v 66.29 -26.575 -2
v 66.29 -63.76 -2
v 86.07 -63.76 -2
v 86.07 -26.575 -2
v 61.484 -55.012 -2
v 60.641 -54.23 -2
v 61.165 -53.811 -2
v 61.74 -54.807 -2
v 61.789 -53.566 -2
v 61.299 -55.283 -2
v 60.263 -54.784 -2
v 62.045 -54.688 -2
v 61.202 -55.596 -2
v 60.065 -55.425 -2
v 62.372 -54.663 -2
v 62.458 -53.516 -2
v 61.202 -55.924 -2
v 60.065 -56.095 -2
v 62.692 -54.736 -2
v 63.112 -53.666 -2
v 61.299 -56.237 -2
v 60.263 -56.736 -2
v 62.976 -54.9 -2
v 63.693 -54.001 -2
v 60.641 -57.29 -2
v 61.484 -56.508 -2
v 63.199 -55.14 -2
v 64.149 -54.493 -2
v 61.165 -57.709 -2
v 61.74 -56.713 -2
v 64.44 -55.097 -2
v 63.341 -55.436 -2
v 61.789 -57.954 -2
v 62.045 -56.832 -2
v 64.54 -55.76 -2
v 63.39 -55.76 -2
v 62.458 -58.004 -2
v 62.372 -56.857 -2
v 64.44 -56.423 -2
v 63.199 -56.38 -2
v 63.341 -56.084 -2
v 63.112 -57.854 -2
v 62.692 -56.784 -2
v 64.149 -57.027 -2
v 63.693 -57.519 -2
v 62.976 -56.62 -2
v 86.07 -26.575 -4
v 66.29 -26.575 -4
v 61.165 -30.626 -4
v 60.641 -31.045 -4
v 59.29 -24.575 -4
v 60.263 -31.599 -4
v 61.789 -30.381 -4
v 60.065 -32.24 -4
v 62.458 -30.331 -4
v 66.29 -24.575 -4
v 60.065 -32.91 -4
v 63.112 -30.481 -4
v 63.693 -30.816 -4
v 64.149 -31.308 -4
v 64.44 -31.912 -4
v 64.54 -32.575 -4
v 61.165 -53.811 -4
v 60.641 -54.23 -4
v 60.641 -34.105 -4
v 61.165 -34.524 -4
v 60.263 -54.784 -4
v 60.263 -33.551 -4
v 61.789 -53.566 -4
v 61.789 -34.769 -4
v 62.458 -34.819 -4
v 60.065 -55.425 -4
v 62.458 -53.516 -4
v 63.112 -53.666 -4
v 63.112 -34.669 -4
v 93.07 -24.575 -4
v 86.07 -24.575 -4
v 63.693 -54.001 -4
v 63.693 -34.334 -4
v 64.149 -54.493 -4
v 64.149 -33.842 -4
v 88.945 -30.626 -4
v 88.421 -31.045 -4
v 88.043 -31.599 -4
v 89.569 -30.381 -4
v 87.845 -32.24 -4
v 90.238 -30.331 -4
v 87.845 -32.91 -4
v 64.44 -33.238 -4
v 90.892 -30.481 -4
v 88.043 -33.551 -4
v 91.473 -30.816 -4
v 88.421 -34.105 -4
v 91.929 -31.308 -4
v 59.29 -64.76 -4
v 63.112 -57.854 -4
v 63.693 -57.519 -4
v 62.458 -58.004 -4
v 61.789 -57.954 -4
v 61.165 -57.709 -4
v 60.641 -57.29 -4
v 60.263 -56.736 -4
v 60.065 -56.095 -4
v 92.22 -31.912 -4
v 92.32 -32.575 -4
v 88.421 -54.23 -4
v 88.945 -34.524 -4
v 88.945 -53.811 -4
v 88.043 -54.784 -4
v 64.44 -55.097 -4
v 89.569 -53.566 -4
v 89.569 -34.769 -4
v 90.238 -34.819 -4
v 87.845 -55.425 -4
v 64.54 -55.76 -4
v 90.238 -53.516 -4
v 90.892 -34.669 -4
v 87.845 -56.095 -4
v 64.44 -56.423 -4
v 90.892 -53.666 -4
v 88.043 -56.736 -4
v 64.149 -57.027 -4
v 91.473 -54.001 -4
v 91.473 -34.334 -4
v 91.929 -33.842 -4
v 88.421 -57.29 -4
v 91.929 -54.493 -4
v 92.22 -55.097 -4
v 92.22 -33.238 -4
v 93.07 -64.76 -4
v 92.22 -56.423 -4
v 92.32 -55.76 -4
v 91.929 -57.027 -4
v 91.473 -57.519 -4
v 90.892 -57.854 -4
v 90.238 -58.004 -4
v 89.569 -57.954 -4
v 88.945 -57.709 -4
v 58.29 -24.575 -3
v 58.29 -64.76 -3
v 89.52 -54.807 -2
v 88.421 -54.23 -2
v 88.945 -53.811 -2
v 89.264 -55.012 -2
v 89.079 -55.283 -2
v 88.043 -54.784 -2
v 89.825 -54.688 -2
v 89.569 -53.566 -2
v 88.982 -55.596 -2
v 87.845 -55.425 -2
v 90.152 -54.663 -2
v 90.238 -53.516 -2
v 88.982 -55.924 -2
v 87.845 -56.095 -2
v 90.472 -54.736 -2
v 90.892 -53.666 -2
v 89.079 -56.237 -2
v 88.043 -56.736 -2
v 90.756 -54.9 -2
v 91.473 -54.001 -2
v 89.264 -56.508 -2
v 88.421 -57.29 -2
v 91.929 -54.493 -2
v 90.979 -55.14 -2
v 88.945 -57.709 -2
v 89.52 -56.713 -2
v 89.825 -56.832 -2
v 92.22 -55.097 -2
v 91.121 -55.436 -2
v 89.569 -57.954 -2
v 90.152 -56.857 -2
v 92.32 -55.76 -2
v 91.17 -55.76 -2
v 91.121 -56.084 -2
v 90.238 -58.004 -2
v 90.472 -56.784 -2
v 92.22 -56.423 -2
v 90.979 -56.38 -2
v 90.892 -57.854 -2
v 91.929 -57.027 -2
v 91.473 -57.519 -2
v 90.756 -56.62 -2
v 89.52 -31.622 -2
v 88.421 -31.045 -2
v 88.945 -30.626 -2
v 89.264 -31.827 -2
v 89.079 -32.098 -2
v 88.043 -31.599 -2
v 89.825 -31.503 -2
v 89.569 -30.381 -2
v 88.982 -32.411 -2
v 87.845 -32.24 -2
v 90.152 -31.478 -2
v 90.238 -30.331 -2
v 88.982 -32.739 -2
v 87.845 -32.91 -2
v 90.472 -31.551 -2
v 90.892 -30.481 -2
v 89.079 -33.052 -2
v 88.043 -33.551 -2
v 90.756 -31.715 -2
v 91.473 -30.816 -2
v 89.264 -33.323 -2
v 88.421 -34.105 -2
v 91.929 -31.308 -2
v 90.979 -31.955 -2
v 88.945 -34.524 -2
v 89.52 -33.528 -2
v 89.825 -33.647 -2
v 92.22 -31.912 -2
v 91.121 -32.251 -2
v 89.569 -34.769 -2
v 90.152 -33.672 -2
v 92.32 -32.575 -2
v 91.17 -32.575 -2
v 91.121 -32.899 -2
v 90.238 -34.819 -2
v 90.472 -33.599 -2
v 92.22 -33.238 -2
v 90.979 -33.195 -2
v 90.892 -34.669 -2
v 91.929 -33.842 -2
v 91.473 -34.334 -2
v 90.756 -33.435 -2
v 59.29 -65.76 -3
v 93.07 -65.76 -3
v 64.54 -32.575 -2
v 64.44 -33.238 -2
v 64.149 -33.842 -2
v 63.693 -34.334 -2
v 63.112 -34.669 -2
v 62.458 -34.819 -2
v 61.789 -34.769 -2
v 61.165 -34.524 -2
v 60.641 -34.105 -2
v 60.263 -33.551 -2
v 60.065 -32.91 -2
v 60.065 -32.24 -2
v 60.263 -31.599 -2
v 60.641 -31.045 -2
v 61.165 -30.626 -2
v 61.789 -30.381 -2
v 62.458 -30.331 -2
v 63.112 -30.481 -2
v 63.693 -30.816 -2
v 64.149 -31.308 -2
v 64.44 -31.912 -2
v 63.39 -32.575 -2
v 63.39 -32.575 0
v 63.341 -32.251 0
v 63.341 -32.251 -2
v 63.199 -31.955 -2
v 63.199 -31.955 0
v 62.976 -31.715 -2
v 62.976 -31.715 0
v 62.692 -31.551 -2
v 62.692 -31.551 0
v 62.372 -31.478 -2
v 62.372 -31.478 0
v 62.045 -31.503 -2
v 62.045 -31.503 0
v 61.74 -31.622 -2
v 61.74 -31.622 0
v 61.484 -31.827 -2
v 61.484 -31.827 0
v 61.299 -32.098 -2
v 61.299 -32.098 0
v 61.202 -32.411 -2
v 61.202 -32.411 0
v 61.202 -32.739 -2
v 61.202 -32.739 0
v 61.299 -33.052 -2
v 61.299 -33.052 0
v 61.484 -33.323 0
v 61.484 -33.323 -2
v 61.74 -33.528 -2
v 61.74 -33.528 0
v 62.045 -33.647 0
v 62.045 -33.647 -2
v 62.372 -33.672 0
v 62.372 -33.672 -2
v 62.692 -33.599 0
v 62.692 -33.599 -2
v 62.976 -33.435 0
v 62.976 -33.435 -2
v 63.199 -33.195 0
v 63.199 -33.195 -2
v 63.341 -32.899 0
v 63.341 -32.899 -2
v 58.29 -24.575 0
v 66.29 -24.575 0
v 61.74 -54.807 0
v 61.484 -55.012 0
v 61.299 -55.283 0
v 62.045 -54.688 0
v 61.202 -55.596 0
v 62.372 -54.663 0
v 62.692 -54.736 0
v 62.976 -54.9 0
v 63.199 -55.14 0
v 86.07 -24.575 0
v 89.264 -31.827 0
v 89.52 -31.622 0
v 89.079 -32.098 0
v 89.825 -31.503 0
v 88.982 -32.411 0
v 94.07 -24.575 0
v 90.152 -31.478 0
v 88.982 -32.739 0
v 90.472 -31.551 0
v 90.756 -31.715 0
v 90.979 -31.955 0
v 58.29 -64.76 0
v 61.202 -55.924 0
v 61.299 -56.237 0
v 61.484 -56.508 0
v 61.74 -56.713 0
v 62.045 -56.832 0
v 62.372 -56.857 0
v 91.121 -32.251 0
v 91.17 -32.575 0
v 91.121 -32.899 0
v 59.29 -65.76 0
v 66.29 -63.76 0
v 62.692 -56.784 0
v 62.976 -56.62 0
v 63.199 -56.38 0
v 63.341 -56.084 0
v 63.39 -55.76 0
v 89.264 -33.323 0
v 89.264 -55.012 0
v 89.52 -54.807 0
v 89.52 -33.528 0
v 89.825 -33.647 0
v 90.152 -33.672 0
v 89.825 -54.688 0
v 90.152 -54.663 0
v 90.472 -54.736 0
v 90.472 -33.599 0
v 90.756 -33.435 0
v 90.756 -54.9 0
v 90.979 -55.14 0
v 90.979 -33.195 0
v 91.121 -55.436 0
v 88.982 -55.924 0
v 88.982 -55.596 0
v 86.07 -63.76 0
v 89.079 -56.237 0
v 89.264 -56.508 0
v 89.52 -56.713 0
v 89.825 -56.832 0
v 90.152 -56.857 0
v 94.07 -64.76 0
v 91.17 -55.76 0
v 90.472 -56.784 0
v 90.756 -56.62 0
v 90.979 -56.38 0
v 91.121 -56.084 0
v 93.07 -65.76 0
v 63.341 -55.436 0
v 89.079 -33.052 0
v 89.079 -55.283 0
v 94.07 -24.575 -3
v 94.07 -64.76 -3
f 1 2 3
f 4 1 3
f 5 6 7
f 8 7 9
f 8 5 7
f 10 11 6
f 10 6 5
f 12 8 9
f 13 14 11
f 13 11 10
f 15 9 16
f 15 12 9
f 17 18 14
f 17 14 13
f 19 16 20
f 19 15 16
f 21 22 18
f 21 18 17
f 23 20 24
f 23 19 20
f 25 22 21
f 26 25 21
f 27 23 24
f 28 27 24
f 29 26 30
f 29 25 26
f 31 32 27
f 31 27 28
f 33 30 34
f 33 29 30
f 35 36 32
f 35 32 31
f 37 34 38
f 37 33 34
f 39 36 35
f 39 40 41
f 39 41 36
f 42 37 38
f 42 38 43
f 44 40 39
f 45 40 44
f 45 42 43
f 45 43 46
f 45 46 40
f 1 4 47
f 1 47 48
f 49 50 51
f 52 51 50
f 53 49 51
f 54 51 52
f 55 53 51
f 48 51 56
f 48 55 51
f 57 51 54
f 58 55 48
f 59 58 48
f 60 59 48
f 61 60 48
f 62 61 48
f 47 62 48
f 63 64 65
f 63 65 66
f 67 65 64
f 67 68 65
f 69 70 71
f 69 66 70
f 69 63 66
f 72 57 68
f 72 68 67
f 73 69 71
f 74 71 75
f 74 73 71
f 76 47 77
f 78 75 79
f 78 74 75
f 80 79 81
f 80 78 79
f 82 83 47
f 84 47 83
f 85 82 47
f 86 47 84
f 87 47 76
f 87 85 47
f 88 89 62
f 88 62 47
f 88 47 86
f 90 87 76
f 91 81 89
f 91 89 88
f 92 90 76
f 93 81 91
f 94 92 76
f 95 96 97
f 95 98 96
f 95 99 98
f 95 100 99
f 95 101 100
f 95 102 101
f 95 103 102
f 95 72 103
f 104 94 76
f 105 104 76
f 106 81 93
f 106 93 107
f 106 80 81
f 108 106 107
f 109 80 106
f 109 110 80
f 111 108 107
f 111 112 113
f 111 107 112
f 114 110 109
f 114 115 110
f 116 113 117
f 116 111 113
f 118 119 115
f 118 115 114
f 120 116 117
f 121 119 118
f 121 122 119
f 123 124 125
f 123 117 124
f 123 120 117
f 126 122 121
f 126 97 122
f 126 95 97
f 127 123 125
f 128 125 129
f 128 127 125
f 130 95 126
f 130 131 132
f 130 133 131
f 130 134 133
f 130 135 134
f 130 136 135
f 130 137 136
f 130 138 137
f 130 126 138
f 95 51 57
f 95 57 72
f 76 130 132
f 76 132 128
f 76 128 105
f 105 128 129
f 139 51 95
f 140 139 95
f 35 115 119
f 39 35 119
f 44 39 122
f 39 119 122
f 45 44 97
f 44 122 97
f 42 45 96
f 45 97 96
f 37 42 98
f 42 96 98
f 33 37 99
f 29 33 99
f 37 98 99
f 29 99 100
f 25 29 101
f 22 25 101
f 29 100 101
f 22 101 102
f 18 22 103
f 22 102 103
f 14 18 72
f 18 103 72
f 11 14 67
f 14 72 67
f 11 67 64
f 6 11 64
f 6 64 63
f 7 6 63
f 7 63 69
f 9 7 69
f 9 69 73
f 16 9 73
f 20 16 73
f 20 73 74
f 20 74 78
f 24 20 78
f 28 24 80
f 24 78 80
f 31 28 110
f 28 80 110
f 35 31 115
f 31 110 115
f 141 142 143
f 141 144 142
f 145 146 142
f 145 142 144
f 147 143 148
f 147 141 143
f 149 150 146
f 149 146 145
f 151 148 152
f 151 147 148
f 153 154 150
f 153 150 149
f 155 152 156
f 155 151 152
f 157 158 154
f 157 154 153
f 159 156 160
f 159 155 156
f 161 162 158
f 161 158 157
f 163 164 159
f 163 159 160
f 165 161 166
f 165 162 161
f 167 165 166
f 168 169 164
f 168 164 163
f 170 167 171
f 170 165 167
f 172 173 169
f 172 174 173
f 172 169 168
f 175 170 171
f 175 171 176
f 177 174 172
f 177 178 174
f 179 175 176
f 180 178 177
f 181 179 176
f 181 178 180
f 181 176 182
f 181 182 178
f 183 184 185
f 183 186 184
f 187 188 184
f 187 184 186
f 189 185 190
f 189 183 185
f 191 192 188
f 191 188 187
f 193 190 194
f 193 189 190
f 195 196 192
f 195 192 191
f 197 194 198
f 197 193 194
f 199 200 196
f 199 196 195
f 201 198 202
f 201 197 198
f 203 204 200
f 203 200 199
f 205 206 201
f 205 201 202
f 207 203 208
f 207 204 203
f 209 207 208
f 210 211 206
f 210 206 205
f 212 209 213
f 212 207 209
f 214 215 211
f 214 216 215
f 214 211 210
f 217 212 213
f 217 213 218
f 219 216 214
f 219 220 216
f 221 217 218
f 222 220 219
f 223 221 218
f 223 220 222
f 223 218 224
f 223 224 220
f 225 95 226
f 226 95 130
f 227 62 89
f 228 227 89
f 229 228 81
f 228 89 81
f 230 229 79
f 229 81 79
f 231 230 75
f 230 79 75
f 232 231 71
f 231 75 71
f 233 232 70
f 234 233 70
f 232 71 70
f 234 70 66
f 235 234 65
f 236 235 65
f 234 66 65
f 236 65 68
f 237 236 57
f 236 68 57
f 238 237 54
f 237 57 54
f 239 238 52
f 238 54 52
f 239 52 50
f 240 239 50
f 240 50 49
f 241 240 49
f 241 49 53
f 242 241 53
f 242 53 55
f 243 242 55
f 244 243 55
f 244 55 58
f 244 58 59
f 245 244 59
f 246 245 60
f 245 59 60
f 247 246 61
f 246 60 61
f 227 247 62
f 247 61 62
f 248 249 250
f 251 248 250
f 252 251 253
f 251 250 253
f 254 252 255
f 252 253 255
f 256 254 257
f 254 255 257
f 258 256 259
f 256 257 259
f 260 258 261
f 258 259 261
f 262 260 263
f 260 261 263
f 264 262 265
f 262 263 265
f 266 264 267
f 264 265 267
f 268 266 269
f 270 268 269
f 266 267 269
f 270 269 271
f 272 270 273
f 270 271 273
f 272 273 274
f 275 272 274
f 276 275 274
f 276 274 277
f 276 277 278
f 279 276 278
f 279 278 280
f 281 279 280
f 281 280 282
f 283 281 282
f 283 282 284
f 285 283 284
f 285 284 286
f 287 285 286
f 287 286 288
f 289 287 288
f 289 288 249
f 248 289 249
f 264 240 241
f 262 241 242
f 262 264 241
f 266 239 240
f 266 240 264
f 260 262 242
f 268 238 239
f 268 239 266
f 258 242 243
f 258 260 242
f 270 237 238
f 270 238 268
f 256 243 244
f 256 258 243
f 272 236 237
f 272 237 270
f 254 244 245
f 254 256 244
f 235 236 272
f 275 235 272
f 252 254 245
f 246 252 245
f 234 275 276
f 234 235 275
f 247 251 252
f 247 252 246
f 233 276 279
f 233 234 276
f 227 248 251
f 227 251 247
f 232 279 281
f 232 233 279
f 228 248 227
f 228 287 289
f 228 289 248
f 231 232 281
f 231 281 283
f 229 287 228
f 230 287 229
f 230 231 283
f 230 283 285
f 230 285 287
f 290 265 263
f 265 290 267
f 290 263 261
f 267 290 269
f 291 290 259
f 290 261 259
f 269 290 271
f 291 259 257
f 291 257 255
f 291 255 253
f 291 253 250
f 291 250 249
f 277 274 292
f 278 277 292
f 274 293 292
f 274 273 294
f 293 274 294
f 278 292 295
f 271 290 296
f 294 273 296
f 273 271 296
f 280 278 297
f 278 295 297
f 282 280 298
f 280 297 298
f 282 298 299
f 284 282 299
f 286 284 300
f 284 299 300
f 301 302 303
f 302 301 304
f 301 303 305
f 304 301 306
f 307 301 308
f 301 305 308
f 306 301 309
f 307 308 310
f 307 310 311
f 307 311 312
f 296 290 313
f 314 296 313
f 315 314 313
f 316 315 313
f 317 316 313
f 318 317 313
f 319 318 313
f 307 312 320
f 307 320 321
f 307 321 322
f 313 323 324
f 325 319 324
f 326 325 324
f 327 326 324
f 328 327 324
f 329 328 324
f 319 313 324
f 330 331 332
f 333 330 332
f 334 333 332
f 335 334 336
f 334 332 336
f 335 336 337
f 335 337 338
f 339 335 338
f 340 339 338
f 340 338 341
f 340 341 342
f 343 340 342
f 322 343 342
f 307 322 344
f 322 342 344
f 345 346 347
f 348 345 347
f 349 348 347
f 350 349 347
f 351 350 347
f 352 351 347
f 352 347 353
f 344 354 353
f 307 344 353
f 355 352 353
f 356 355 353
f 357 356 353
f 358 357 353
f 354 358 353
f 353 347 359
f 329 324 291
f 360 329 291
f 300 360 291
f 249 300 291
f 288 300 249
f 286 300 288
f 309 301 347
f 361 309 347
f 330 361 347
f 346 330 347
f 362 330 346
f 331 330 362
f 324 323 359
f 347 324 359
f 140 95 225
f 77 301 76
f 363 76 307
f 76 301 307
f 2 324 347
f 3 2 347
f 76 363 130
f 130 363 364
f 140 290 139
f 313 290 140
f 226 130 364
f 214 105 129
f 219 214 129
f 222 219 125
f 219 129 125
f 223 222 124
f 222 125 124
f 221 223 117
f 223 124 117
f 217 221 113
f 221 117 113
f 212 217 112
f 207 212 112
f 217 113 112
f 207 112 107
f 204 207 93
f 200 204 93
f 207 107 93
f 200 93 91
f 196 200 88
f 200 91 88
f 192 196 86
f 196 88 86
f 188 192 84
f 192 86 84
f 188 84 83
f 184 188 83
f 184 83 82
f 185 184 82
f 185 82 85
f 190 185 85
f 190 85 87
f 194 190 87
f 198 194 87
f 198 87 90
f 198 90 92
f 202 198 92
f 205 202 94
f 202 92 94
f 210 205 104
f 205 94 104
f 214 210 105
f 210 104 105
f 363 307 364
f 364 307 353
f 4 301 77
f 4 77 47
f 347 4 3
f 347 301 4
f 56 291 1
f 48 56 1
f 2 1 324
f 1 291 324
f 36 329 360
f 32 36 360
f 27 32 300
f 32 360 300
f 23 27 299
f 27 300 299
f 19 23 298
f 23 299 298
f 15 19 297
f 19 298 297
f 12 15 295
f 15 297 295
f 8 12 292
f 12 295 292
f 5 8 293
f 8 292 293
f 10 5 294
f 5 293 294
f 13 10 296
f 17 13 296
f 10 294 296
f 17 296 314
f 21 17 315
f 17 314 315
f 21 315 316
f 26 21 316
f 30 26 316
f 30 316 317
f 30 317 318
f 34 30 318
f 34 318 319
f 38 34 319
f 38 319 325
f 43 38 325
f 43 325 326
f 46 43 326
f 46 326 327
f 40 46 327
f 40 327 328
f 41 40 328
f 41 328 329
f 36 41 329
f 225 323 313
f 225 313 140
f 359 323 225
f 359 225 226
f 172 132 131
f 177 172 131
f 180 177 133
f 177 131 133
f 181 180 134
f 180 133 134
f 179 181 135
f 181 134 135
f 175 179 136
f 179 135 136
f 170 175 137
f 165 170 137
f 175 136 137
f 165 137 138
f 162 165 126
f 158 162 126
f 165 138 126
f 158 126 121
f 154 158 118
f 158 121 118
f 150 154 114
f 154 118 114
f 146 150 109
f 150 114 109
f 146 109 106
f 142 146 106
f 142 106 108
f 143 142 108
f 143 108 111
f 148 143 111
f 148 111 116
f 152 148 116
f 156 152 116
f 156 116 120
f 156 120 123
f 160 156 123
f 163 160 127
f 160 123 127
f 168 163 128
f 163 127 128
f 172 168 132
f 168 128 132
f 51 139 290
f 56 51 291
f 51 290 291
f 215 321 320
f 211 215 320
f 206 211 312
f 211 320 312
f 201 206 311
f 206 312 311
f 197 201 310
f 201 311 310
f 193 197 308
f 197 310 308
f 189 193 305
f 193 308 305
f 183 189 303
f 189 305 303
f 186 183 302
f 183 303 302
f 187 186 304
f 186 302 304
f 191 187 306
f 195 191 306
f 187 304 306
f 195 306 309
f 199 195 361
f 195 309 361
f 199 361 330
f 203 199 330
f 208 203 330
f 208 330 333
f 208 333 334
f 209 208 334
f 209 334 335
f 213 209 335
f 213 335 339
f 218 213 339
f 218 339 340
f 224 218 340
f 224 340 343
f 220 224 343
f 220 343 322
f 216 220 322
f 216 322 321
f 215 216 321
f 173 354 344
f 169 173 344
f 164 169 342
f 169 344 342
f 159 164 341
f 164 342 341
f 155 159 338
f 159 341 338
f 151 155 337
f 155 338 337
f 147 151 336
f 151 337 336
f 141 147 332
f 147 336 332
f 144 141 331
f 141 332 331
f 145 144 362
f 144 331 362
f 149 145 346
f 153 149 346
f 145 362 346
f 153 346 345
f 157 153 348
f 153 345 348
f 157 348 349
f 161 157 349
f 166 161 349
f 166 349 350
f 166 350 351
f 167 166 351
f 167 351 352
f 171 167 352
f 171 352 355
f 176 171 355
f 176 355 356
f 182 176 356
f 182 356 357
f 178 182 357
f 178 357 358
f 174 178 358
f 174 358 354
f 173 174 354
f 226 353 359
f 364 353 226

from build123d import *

# Parameters (mm, degrees)
SKETCH003_W     = 35.78
SKETCH003_H     = 41.185
PAD002_DEPTH    = 4
SKETCH004_W     = 19.78
SKETCH004_H     = 39.185
POCKET003_DEPTH = 2
SKETCH006_R     = 1.1
POCKET005_DEPTH = 4.001
SKETCH007_R     = 2.25
POCKET006_DEPTH = 2
CHAMFER001_SIZE = 1
SKETCH019_W     = 19.78
SKETCH019_H     = 2
POCKET015_DEPTH = 2


with BuildPart() as part:
    # Sketch003 (on ShapeBinder) → Pad002 (new body)
    with BuildSketch(Plane(origin=(0, 0, 0), x_dir=(1, 0, 0), z_dir=(0, 0, -1))):
        with Locations((76.18, 45.1675)):
            Rectangle(SKETCH003_W, SKETCH003_H)
    extrude(amount=PAD002_DEPTH)

    # Sketch004 (on ShapeBinder) → Pocket003 (cut)
    with BuildSketch(Plane(origin=(0, 0, 0), x_dir=(1, 0, 0), z_dir=(0, 0, -1))):
        with Locations((76.18, 44.1675)):
            Rectangle(SKETCH004_W, SKETCH004_H)
    extrude(amount=POCKET003_DEPTH, mode=Mode.SUBTRACT)

    # Sketch006 (on Face4 of Pocket003) → Pocket005 (cut, through all)
    with BuildSketch(Plane.XY):
        with Locations((62.29, -32.575)):
            Circle(SKETCH006_R)
        with Locations((90.07, -32.575)):
            Circle(SKETCH006_R)
        with Locations((90.07, -55.76)):
            Circle(SKETCH006_R)
        with Locations((62.29, -55.76)):
            Circle(SKETCH006_R)
    extrude(amount=-POCKET005_DEPTH, mode=Mode.SUBTRACT)

    # Sketch007 (on Face5 of Pocket005) → Pocket006 (cut)
    with BuildSketch(Plane(origin=(0, 0, -4), x_dir=(1, 0, 0), z_dir=(0, 0, -1))):
        with Locations((62.29, 55.76)):
            Circle(SKETCH007_R)
        with Locations((90.07, 55.76)):
            Circle(SKETCH007_R)
        with Locations((90.07, 32.575)):
            Circle(SKETCH007_R)
        with Locations((62.29, 32.575)):
            Circle(SKETCH007_R)
    extrude(amount=-POCKET006_DEPTH, mode=Mode.SUBTRACT)

    # Chamfer001
    chamfer001_edges = [part.edges().sort_by_distance(p)[0] for p in [
        (76.18, -65.76, -4),
        (94.07, -45.1675, -4),
        (58.29, -45.1675, -4),
        (58.29, -65.76, -2),
        (94.07, -65.76, -2),
    ]]
    chamfer(chamfer001_edges, length=CHAMFER001_SIZE)

    # Sketch019 (on Face7 of Chamfer001) → Pocket015 (cut)
    with BuildSketch(Plane(origin=(0, -24.575, 0), x_dir=(-1, 0, 0), z_dir=(0, 1, 0))):
        with Locations((-76.18, -3)):
            Rectangle(SKETCH019_W, SKETCH019_H)
    extrude(amount=-POCKET015_DEPTH, mode=Mode.SUBTRACT)


solid = part.part
